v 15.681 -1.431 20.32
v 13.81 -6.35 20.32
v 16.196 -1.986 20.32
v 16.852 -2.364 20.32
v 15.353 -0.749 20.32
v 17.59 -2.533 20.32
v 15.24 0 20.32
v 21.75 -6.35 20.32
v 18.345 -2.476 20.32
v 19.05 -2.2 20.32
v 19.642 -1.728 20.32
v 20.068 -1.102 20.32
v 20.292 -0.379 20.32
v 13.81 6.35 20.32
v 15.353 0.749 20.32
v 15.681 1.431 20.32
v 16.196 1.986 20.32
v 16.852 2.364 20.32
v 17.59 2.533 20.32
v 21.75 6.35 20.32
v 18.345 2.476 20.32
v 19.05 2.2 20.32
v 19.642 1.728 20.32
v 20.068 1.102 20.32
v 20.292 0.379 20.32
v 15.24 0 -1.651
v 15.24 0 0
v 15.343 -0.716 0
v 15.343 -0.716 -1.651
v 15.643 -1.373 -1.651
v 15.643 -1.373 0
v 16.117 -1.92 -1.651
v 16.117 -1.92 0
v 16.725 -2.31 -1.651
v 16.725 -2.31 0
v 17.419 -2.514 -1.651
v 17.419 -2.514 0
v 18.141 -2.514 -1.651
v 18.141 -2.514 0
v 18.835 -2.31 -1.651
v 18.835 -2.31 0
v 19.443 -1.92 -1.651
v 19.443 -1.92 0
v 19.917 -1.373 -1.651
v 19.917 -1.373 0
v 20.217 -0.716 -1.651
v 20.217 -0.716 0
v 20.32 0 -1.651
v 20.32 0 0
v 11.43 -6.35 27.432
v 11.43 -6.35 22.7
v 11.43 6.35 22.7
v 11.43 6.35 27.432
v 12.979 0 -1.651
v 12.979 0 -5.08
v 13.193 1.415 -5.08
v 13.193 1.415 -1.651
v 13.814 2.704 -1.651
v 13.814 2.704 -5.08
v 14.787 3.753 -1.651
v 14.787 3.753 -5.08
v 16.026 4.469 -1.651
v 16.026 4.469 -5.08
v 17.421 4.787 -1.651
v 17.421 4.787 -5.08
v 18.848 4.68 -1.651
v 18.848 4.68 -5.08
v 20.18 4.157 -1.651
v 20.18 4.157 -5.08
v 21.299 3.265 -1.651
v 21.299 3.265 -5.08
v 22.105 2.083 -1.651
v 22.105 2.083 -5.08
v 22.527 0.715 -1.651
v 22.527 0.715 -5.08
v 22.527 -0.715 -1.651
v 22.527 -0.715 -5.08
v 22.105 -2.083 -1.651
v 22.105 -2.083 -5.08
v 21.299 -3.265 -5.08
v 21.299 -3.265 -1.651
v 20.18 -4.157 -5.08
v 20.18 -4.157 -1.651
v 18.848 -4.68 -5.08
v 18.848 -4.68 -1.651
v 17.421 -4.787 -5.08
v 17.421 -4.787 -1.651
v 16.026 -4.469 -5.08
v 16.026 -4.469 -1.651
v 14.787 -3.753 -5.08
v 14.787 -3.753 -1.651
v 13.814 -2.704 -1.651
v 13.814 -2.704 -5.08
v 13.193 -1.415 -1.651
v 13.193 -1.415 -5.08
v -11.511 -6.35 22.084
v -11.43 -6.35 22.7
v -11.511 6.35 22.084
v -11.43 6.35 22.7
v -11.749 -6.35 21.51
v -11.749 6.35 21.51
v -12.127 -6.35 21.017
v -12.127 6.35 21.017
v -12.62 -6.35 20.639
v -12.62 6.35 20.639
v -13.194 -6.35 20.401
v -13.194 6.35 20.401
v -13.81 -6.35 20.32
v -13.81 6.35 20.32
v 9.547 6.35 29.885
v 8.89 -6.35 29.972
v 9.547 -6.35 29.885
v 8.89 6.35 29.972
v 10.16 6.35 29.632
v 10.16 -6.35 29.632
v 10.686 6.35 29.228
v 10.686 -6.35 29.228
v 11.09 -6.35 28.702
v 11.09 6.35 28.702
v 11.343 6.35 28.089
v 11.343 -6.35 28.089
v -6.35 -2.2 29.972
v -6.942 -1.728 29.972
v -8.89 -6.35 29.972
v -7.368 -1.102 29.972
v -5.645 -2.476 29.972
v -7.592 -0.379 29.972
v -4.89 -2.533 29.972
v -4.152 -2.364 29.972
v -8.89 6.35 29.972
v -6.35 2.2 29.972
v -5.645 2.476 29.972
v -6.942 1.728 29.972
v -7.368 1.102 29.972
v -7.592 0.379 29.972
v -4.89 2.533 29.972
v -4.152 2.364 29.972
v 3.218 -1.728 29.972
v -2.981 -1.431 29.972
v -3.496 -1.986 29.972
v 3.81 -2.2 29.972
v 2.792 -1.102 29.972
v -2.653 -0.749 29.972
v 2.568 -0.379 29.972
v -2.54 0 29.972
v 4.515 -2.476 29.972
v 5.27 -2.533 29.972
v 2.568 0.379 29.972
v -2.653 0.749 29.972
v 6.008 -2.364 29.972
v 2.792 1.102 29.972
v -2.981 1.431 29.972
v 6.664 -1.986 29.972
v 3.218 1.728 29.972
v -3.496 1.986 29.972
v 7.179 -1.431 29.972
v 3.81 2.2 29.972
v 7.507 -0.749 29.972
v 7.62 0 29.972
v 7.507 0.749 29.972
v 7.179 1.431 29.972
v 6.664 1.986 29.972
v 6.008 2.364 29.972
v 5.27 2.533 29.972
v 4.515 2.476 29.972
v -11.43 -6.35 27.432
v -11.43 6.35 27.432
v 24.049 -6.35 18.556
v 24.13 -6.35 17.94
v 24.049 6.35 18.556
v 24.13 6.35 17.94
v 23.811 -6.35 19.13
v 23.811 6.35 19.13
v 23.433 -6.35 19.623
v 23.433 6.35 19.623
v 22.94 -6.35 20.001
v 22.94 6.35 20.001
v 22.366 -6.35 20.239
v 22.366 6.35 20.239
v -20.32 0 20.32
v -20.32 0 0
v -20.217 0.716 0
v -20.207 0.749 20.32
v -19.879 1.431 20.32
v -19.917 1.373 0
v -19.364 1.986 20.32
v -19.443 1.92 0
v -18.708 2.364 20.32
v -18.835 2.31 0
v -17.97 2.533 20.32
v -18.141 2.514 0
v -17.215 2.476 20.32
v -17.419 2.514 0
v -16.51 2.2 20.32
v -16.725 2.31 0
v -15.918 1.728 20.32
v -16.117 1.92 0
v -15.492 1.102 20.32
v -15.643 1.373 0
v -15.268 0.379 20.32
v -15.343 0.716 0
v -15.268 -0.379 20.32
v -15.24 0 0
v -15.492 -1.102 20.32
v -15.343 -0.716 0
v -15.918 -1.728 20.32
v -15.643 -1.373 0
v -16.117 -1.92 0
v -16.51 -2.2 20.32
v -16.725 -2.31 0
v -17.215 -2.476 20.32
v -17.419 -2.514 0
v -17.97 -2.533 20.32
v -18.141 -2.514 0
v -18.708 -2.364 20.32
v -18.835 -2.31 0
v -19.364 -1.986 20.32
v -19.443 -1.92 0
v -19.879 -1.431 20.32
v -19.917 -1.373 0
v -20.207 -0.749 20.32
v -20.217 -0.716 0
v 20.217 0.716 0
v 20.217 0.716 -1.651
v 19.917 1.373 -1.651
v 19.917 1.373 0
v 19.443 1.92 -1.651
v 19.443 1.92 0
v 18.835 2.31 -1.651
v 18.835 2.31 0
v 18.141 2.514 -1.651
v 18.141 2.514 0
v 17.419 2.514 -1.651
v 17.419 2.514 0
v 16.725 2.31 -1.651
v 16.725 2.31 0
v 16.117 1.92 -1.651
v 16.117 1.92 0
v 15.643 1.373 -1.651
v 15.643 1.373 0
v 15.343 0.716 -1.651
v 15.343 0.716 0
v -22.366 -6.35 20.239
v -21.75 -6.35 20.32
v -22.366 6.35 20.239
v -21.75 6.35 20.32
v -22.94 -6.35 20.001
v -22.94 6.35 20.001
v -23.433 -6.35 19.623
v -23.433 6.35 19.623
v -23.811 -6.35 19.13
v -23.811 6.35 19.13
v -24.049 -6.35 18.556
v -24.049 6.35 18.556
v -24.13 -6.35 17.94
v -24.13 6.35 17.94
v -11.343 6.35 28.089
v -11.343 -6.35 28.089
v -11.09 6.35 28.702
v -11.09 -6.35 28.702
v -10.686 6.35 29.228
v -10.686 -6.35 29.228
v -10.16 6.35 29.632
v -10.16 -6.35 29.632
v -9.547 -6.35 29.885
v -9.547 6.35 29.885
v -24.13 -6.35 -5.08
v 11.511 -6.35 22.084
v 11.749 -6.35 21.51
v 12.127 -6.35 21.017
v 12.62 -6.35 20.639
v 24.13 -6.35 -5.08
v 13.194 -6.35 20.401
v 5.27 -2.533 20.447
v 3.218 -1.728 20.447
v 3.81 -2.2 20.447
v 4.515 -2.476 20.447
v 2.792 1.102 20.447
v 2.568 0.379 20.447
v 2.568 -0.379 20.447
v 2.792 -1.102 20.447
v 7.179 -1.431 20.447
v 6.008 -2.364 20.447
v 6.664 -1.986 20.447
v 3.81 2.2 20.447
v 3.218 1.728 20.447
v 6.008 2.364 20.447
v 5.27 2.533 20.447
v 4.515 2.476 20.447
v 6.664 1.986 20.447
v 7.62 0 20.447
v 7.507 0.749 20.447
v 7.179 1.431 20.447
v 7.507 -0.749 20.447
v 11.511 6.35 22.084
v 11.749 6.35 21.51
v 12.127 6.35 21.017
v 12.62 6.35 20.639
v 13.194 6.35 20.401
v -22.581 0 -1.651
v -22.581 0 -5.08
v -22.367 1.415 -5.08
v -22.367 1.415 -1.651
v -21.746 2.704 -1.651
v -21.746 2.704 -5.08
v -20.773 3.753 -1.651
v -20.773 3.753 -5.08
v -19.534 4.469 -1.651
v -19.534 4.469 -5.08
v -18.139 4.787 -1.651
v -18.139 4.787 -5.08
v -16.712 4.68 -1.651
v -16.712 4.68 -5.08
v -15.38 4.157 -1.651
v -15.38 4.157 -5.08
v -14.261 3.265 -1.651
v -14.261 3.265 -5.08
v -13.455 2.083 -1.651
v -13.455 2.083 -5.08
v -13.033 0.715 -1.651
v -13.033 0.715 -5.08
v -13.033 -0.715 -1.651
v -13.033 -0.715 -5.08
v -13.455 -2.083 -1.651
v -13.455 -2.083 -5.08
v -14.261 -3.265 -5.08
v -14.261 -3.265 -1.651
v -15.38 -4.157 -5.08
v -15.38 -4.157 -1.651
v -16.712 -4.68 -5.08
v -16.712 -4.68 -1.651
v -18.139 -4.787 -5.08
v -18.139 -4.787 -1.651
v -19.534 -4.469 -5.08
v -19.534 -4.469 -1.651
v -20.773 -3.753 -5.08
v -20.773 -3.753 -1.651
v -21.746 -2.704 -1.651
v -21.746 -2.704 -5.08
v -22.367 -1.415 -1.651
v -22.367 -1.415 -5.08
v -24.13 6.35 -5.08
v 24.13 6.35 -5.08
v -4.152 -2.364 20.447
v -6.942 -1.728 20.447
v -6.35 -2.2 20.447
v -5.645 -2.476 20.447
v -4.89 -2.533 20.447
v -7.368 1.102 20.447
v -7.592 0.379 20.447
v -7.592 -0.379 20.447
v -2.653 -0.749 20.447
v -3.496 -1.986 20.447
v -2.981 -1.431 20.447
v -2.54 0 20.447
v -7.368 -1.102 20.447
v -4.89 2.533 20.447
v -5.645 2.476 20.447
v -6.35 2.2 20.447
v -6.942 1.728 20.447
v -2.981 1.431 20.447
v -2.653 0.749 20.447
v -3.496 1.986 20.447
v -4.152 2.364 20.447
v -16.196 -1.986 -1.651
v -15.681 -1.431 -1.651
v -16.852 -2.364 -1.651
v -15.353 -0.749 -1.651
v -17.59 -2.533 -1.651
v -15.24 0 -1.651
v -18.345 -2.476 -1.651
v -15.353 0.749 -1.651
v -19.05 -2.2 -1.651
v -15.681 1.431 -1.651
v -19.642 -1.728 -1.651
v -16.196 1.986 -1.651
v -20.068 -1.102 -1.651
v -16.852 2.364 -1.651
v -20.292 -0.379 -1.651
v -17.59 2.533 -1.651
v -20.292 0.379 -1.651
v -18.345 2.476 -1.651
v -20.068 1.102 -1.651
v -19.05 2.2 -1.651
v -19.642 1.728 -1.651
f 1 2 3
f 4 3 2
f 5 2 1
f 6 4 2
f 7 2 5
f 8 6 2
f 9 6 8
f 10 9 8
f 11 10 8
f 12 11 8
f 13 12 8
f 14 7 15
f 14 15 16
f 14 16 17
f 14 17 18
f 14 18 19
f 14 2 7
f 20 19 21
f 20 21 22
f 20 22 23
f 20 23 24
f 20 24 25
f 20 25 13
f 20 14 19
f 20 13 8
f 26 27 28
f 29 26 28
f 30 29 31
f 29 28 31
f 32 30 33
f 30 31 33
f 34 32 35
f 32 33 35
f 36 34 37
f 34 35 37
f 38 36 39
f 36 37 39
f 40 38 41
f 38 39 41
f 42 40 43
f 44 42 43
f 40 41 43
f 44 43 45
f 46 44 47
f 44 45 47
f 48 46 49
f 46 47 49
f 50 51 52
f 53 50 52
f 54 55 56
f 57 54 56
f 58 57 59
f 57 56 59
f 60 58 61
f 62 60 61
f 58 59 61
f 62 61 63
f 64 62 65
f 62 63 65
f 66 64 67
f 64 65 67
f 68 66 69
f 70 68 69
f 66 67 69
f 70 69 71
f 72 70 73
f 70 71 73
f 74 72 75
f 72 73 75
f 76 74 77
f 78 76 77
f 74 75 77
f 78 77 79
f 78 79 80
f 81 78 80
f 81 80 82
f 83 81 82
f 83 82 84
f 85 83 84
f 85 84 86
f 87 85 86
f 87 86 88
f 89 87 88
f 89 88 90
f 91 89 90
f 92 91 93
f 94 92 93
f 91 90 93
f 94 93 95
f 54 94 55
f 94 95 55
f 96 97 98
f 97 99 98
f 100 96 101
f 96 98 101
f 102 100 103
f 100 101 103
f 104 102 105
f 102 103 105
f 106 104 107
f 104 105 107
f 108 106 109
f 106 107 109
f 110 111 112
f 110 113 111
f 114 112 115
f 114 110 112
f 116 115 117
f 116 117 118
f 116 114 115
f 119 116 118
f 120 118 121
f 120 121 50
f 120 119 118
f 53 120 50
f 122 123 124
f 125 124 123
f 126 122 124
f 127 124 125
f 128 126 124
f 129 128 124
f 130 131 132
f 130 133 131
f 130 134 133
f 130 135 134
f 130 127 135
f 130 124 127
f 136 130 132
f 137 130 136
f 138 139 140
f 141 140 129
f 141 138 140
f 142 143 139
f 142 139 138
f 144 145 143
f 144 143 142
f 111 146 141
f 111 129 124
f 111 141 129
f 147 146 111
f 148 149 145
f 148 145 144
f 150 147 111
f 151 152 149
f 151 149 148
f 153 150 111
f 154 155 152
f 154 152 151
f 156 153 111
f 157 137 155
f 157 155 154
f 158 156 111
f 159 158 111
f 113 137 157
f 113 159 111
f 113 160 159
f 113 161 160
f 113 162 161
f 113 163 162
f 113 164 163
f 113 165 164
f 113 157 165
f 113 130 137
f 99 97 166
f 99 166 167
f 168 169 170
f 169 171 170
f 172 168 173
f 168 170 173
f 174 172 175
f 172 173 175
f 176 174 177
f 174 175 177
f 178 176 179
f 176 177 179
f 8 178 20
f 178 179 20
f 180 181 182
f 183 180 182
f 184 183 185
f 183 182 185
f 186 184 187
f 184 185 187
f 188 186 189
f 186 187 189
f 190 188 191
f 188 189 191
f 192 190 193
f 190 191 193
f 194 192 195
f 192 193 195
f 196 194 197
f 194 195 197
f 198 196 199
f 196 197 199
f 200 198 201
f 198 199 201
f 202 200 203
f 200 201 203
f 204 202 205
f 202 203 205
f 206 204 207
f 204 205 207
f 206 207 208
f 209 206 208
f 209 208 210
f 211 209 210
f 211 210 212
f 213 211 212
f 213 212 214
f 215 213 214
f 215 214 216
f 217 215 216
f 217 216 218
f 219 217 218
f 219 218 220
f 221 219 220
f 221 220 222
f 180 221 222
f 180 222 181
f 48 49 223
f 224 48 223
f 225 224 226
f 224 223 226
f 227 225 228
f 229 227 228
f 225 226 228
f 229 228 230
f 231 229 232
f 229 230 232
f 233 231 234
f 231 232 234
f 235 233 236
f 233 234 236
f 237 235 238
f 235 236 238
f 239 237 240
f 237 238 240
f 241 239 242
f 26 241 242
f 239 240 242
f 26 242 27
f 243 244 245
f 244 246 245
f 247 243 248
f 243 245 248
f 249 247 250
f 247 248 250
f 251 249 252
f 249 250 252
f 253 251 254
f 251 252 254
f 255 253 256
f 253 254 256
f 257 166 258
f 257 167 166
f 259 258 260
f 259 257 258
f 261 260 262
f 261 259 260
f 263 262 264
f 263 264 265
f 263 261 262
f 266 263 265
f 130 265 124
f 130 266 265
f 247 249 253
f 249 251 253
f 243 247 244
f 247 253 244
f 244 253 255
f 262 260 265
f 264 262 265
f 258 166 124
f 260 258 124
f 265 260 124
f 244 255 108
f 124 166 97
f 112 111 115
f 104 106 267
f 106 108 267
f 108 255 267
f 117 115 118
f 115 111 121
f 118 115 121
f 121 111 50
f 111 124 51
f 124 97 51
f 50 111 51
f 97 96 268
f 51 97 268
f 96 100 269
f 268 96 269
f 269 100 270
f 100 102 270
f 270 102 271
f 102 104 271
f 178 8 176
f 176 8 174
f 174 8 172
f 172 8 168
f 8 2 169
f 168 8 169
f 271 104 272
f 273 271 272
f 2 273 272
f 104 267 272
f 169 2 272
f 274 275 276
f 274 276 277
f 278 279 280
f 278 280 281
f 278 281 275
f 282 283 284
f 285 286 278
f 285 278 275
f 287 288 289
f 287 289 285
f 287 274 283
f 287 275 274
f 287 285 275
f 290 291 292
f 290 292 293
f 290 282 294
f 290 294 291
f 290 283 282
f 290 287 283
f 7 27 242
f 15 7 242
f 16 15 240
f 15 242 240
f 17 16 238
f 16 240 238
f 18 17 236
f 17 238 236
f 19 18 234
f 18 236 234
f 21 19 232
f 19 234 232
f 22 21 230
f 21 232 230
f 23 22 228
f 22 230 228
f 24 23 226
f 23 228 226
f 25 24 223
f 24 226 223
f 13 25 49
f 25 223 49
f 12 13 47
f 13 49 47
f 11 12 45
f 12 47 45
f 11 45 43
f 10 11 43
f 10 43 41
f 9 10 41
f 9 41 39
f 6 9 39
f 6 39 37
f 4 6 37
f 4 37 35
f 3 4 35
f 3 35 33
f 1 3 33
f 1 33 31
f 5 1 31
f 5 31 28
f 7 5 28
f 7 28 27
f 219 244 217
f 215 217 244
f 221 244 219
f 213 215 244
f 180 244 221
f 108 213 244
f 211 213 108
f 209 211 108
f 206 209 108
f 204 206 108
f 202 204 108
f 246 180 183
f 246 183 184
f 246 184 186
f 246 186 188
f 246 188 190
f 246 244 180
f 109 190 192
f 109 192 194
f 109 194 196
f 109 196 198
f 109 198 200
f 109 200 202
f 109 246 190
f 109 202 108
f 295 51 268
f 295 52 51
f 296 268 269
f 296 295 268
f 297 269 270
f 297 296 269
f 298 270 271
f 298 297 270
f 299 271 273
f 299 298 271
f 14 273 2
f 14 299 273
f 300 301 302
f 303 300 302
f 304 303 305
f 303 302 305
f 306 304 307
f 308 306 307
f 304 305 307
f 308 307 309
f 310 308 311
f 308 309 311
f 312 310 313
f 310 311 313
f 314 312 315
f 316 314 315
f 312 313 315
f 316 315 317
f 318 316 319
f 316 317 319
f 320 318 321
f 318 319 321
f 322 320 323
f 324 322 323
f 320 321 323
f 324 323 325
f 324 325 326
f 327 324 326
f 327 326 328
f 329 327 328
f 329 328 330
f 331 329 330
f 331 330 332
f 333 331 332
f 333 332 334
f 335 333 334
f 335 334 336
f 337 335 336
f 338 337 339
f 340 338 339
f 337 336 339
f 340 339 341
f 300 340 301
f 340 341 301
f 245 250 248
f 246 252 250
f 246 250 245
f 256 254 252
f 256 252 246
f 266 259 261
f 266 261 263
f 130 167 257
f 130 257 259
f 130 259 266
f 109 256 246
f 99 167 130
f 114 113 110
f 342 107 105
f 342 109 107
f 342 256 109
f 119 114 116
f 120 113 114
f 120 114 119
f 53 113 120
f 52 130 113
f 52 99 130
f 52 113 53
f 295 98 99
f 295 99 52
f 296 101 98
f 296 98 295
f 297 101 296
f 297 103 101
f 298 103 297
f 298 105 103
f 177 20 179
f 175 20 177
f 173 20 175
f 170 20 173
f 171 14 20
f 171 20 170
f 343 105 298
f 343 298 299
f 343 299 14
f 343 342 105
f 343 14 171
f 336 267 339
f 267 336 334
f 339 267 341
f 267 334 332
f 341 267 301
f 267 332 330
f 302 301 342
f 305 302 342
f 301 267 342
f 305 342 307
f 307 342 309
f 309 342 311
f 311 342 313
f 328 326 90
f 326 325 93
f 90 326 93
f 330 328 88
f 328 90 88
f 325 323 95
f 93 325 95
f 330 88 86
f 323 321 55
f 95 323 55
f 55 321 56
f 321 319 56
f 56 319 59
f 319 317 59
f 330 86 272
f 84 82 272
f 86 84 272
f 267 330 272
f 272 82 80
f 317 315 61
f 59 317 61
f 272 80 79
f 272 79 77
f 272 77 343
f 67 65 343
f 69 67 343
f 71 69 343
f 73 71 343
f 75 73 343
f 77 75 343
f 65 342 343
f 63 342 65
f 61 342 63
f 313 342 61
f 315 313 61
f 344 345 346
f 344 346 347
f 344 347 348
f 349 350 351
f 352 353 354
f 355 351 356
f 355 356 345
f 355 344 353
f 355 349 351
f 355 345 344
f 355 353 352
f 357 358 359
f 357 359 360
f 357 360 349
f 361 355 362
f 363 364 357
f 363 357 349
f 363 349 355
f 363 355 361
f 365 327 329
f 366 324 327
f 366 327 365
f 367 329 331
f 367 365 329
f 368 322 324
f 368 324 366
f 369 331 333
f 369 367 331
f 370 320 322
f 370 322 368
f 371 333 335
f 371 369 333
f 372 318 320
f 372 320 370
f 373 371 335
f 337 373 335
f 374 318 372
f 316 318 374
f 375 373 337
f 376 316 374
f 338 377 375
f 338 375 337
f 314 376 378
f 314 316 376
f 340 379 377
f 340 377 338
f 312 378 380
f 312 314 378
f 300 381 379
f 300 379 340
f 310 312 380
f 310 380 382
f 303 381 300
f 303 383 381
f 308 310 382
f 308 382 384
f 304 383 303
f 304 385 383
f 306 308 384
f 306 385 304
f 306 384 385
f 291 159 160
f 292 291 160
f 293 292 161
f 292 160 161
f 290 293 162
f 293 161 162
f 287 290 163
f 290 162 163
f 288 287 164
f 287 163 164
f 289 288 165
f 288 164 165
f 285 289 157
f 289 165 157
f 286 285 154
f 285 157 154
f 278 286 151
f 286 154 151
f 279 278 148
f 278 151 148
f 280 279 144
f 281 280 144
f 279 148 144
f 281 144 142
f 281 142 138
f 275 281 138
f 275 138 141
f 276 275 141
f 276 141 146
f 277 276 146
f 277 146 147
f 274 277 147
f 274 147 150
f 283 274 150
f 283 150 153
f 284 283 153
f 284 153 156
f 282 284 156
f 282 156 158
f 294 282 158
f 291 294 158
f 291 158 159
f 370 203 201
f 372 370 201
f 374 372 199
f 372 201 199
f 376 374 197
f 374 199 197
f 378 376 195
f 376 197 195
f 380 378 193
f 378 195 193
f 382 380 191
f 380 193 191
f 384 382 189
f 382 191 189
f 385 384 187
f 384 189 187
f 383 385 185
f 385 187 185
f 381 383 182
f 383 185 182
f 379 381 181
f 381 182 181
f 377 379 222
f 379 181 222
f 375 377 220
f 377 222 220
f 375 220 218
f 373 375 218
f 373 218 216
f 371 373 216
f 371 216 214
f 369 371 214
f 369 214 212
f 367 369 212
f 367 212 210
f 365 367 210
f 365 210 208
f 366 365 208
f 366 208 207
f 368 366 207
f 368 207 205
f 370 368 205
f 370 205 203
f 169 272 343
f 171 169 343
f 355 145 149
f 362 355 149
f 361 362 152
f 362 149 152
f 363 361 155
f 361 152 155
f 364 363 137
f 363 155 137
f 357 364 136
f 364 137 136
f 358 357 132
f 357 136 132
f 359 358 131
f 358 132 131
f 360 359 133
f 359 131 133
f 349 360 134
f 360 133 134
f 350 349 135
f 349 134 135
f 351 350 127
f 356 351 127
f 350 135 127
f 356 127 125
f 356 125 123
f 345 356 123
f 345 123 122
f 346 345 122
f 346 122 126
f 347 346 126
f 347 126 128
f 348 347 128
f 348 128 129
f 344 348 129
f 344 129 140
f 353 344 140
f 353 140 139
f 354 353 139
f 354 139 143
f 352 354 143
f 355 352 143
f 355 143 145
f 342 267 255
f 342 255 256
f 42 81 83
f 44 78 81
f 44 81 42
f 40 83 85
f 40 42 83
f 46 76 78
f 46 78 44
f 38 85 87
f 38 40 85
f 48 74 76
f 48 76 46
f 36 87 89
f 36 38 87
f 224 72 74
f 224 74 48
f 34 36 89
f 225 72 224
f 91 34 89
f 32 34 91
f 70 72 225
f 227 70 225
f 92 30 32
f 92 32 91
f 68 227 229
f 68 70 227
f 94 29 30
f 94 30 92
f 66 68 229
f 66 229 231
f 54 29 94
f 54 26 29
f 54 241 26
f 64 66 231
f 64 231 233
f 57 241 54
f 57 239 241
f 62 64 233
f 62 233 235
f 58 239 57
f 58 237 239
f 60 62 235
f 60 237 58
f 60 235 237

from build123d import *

# Parameters (mm, degrees)
SKETCH1_W            = 48.26
SKETCH1_H            = 12.7
SKETCH1_R            = 2.54
BOSS_EXTRUDE2_DEPTH  = 5.08
SKETCH3_R            = 2.54
CUT_EXTRUDE1_DEPTH   = 6.08
SKETCH4_W            = 3.81
SKETCH4_H            = 12.7
BOSS_EXTRUDE5_DEPTH  = 27.94
SKETCH5_W            = 3.81
SKETCH5_H            = 12.7
BOSS_EXTRUDE6_DEPTH  = 27.94
SKETCH7_W            = 22.86
SKETCH7_H            = 12.7
BOSS_EXTRUDE8_DEPTH  = 2.032
SKETCH10_R           = 2.54
CUT_EXTRUDE4_DEPTH   = 2.032
SKETCH11_R           = 2.54
CUT_EXTRUDE5_DEPTH   = 2.032
FILLET12_R           = 2.54
SKETCH12_W           = 15.24
SKETCH12_H           = 12.7
BOSS_EXTRUDE9_DEPTH  = 27.94
SKETCH13_R           = 2.54
CUT_EXTRUDE6_DEPTH   = 7.493
SKETCH14_R           = 2.54
CUT_EXTRUDE7_DEPTH   = 7.493
SKETCH20_R           = 4.8006
CUT_EXTRUDE13_DEPTH  = 3.429
SKETCH21_W           = 12.7
SKETCH21_H           = 12.7
BOSS_EXTRUDE10_DEPTH = 20.32
SKETCH22_R           = 2.54
CUT_EXTRUDE14_DEPTH  = 20.32
SKETCH23_W           = 12.7
SKETCH23_H           = 12.7
BOSS_EXTRUDE11_DEPTH = 20.32
SKETCH24_R           = 2.54
CUT_EXTRUDE15_DEPTH  = 25.4
SKETCH26_R           = 4.8006
CUT_EXTRUDE16_DEPTH  = 3.429
FILLET15_R           = 2.38
FILLET16_R           = 2.38
FILLET17_R           = 2.38


with BuildPart() as part:
    # Sketch1 → Boss-Extrude2 (new body)
    with BuildSketch(Plane.XY):
        Rectangle(SKETCH1_W, SKETCH1_H)
        with Locations((-17.78, 0)):
            Circle(SKETCH1_R, mode=Mode.SUBTRACT)
    extrude(amount=-BOSS_EXTRUDE2_DEPTH)

    # Sketch3 → Cut-Extrude1 (cut, through all)
    with BuildSketch(Plane.XY):
        with Locations((17.78, 0)):
            Circle(SKETCH3_R)
    extrude(amount=-CUT_EXTRUDE1_DEPTH, mode=Mode.SUBTRACT)

    # Sketch4 → Boss-Extrude5 (add)
    with BuildSketch(Plane.XY):
        with Locations((-9.525, 0)):
            Rectangle(SKETCH4_W, SKETCH4_H)
    extrude(amount=BOSS_EXTRUDE5_DEPTH)

    # Sketch5 → Boss-Extrude6 (add)
    with BuildSketch(Plane.XY):
        with Locations((9.525, 0)):
            Rectangle(SKETCH5_W, SKETCH5_H)
    extrude(amount=BOSS_EXTRUDE6_DEPTH)

    # Sketch7 → Boss-Extrude8 (add)
    with BuildSketch(Plane.XY.offset(27.94)):
        Rectangle(SKETCH7_W, SKETCH7_H)
    extrude(amount=BOSS_EXTRUDE8_DEPTH)

    # Sketch10 → Cut-Extrude4 (cut)
    with BuildSketch(Plane.XY.offset(29.972)):
        with Locations((-5.08, 0)):
            Circle(SKETCH10_R)
    extrude(amount=-CUT_EXTRUDE4_DEPTH, mode=Mode.SUBTRACT)

    # Sketch11 → Cut-Extrude5 (cut)
    with BuildSketch(Plane.XY.offset(29.972)):
        with Locations((5.08, 0)):
            Circle(SKETCH11_R)
    extrude(amount=-CUT_EXTRUDE5_DEPTH, mode=Mode.SUBTRACT)

    # Fillet12
    fillet12_edges = [part.edges().sort_by_distance(p)[0] for p in [
        (-11.43, 0, 29.972),
        (11.43, 0, 29.972),
    ]]
    fillet(fillet12_edges, radius=FILLET12_R)

    # Sketch12 → Boss-Extrude9 (add)
    with BuildSketch(Plane.XY):
        Rectangle(SKETCH12_W, SKETCH12_H)
    extrude(amount=BOSS_EXTRUDE9_DEPTH)

    # Sketch13 → Cut-Extrude6 (cut)
    with BuildSketch(Plane.XY.offset(27.94)):
        with Locations((-5.08, 0)):
            Circle(SKETCH13_R)
    extrude(amount=-CUT_EXTRUDE6_DEPTH, mode=Mode.SUBTRACT)

    # Sketch14 → Cut-Extrude7 (cut)
    with BuildSketch(Plane.XY.offset(27.94)):
        with Locations((5.08, 0)):
            Circle(SKETCH14_R)
    extrude(amount=-CUT_EXTRUDE7_DEPTH, mode=Mode.SUBTRACT)

    # Sketch20 → Cut-Extrude13 (cut)
    with BuildSketch(Plane(origin=(0, 0, -5.08), x_dir=(-1, 0, 0), z_dir=(0, 0, -1))):
        with Locations((17.78, 0)):
            Circle(SKETCH20_R)
    extrude(amount=-CUT_EXTRUDE13_DEPTH, mode=Mode.SUBTRACT)

    # Sketch21 → Boss-Extrude10 (add)
    with BuildSketch(Plane.XY):
        with Locations((-17.78, 0)):
            Rectangle(SKETCH21_W, SKETCH21_H)
    extrude(amount=BOSS_EXTRUDE10_DEPTH)

    # Sketch22 → Cut-Extrude14 (cut)
    with BuildSketch(Plane(origin=(0, 0, 0), x_dir=(-1, 0, 0), z_dir=(0, 0, -1))):
        with Locations((17.78, 0)):
            Circle(SKETCH22_R)
    extrude(amount=-CUT_EXTRUDE14_DEPTH, mode=Mode.SUBTRACT)

    # Sketch23 → Boss-Extrude11 (add)
    with BuildSketch(Plane.XY):
        with Locations((17.78, 0)):
            Rectangle(SKETCH23_W, SKETCH23_H)
    extrude(amount=BOSS_EXTRUDE11_DEPTH)

    # Sketch24 → Cut-Extrude15 (cut)
    with BuildSketch(Plane(origin=(0, 0, -5.08), x_dir=(-1, 0, 0), z_dir=(0, 0, -1))):
        with Locations((-17.78, 0)):
            Circle(SKETCH24_R)
    extrude(amount=-CUT_EXTRUDE15_DEPTH, mode=Mode.SUBTRACT)

    # Sketch26 → Cut-Extrude16 (cut)
    with BuildSketch(Plane(origin=(0, 0, -5.08), x_dir=(-1, 0, 0), z_dir=(0, 0, -1))):
        with Locations((-17.78, 0)):
            Circle(SKETCH26_R)
    extrude(amount=-CUT_EXTRUDE16_DEPTH, mode=Mode.SUBTRACT)

    # Fillet15
    fillet15_edges = [part.edges().sort_by_distance(p)[0] for p in [
        (11.43, 0, 20.32),
    ]]
    fillet(fillet15_edges, radius=FILLET15_R)

    # Fillet16
    fillet16_edges = [part.edges().sort_by_distance(p)[0] for p in [
        (-11.43, 0, 20.32),
    ]]
    fillet(fillet16_edges, radius=FILLET16_R)

    # Fillet17
    fillet17_edges = [part.edges().sort_by_distance(p)[0] for p in [
        (-24.13, 0, 20.32),
        (24.13, 0, 20.32),
    ]]
    fillet(fillet17_edges, radius=FILLET17_R)


solid = part.part
